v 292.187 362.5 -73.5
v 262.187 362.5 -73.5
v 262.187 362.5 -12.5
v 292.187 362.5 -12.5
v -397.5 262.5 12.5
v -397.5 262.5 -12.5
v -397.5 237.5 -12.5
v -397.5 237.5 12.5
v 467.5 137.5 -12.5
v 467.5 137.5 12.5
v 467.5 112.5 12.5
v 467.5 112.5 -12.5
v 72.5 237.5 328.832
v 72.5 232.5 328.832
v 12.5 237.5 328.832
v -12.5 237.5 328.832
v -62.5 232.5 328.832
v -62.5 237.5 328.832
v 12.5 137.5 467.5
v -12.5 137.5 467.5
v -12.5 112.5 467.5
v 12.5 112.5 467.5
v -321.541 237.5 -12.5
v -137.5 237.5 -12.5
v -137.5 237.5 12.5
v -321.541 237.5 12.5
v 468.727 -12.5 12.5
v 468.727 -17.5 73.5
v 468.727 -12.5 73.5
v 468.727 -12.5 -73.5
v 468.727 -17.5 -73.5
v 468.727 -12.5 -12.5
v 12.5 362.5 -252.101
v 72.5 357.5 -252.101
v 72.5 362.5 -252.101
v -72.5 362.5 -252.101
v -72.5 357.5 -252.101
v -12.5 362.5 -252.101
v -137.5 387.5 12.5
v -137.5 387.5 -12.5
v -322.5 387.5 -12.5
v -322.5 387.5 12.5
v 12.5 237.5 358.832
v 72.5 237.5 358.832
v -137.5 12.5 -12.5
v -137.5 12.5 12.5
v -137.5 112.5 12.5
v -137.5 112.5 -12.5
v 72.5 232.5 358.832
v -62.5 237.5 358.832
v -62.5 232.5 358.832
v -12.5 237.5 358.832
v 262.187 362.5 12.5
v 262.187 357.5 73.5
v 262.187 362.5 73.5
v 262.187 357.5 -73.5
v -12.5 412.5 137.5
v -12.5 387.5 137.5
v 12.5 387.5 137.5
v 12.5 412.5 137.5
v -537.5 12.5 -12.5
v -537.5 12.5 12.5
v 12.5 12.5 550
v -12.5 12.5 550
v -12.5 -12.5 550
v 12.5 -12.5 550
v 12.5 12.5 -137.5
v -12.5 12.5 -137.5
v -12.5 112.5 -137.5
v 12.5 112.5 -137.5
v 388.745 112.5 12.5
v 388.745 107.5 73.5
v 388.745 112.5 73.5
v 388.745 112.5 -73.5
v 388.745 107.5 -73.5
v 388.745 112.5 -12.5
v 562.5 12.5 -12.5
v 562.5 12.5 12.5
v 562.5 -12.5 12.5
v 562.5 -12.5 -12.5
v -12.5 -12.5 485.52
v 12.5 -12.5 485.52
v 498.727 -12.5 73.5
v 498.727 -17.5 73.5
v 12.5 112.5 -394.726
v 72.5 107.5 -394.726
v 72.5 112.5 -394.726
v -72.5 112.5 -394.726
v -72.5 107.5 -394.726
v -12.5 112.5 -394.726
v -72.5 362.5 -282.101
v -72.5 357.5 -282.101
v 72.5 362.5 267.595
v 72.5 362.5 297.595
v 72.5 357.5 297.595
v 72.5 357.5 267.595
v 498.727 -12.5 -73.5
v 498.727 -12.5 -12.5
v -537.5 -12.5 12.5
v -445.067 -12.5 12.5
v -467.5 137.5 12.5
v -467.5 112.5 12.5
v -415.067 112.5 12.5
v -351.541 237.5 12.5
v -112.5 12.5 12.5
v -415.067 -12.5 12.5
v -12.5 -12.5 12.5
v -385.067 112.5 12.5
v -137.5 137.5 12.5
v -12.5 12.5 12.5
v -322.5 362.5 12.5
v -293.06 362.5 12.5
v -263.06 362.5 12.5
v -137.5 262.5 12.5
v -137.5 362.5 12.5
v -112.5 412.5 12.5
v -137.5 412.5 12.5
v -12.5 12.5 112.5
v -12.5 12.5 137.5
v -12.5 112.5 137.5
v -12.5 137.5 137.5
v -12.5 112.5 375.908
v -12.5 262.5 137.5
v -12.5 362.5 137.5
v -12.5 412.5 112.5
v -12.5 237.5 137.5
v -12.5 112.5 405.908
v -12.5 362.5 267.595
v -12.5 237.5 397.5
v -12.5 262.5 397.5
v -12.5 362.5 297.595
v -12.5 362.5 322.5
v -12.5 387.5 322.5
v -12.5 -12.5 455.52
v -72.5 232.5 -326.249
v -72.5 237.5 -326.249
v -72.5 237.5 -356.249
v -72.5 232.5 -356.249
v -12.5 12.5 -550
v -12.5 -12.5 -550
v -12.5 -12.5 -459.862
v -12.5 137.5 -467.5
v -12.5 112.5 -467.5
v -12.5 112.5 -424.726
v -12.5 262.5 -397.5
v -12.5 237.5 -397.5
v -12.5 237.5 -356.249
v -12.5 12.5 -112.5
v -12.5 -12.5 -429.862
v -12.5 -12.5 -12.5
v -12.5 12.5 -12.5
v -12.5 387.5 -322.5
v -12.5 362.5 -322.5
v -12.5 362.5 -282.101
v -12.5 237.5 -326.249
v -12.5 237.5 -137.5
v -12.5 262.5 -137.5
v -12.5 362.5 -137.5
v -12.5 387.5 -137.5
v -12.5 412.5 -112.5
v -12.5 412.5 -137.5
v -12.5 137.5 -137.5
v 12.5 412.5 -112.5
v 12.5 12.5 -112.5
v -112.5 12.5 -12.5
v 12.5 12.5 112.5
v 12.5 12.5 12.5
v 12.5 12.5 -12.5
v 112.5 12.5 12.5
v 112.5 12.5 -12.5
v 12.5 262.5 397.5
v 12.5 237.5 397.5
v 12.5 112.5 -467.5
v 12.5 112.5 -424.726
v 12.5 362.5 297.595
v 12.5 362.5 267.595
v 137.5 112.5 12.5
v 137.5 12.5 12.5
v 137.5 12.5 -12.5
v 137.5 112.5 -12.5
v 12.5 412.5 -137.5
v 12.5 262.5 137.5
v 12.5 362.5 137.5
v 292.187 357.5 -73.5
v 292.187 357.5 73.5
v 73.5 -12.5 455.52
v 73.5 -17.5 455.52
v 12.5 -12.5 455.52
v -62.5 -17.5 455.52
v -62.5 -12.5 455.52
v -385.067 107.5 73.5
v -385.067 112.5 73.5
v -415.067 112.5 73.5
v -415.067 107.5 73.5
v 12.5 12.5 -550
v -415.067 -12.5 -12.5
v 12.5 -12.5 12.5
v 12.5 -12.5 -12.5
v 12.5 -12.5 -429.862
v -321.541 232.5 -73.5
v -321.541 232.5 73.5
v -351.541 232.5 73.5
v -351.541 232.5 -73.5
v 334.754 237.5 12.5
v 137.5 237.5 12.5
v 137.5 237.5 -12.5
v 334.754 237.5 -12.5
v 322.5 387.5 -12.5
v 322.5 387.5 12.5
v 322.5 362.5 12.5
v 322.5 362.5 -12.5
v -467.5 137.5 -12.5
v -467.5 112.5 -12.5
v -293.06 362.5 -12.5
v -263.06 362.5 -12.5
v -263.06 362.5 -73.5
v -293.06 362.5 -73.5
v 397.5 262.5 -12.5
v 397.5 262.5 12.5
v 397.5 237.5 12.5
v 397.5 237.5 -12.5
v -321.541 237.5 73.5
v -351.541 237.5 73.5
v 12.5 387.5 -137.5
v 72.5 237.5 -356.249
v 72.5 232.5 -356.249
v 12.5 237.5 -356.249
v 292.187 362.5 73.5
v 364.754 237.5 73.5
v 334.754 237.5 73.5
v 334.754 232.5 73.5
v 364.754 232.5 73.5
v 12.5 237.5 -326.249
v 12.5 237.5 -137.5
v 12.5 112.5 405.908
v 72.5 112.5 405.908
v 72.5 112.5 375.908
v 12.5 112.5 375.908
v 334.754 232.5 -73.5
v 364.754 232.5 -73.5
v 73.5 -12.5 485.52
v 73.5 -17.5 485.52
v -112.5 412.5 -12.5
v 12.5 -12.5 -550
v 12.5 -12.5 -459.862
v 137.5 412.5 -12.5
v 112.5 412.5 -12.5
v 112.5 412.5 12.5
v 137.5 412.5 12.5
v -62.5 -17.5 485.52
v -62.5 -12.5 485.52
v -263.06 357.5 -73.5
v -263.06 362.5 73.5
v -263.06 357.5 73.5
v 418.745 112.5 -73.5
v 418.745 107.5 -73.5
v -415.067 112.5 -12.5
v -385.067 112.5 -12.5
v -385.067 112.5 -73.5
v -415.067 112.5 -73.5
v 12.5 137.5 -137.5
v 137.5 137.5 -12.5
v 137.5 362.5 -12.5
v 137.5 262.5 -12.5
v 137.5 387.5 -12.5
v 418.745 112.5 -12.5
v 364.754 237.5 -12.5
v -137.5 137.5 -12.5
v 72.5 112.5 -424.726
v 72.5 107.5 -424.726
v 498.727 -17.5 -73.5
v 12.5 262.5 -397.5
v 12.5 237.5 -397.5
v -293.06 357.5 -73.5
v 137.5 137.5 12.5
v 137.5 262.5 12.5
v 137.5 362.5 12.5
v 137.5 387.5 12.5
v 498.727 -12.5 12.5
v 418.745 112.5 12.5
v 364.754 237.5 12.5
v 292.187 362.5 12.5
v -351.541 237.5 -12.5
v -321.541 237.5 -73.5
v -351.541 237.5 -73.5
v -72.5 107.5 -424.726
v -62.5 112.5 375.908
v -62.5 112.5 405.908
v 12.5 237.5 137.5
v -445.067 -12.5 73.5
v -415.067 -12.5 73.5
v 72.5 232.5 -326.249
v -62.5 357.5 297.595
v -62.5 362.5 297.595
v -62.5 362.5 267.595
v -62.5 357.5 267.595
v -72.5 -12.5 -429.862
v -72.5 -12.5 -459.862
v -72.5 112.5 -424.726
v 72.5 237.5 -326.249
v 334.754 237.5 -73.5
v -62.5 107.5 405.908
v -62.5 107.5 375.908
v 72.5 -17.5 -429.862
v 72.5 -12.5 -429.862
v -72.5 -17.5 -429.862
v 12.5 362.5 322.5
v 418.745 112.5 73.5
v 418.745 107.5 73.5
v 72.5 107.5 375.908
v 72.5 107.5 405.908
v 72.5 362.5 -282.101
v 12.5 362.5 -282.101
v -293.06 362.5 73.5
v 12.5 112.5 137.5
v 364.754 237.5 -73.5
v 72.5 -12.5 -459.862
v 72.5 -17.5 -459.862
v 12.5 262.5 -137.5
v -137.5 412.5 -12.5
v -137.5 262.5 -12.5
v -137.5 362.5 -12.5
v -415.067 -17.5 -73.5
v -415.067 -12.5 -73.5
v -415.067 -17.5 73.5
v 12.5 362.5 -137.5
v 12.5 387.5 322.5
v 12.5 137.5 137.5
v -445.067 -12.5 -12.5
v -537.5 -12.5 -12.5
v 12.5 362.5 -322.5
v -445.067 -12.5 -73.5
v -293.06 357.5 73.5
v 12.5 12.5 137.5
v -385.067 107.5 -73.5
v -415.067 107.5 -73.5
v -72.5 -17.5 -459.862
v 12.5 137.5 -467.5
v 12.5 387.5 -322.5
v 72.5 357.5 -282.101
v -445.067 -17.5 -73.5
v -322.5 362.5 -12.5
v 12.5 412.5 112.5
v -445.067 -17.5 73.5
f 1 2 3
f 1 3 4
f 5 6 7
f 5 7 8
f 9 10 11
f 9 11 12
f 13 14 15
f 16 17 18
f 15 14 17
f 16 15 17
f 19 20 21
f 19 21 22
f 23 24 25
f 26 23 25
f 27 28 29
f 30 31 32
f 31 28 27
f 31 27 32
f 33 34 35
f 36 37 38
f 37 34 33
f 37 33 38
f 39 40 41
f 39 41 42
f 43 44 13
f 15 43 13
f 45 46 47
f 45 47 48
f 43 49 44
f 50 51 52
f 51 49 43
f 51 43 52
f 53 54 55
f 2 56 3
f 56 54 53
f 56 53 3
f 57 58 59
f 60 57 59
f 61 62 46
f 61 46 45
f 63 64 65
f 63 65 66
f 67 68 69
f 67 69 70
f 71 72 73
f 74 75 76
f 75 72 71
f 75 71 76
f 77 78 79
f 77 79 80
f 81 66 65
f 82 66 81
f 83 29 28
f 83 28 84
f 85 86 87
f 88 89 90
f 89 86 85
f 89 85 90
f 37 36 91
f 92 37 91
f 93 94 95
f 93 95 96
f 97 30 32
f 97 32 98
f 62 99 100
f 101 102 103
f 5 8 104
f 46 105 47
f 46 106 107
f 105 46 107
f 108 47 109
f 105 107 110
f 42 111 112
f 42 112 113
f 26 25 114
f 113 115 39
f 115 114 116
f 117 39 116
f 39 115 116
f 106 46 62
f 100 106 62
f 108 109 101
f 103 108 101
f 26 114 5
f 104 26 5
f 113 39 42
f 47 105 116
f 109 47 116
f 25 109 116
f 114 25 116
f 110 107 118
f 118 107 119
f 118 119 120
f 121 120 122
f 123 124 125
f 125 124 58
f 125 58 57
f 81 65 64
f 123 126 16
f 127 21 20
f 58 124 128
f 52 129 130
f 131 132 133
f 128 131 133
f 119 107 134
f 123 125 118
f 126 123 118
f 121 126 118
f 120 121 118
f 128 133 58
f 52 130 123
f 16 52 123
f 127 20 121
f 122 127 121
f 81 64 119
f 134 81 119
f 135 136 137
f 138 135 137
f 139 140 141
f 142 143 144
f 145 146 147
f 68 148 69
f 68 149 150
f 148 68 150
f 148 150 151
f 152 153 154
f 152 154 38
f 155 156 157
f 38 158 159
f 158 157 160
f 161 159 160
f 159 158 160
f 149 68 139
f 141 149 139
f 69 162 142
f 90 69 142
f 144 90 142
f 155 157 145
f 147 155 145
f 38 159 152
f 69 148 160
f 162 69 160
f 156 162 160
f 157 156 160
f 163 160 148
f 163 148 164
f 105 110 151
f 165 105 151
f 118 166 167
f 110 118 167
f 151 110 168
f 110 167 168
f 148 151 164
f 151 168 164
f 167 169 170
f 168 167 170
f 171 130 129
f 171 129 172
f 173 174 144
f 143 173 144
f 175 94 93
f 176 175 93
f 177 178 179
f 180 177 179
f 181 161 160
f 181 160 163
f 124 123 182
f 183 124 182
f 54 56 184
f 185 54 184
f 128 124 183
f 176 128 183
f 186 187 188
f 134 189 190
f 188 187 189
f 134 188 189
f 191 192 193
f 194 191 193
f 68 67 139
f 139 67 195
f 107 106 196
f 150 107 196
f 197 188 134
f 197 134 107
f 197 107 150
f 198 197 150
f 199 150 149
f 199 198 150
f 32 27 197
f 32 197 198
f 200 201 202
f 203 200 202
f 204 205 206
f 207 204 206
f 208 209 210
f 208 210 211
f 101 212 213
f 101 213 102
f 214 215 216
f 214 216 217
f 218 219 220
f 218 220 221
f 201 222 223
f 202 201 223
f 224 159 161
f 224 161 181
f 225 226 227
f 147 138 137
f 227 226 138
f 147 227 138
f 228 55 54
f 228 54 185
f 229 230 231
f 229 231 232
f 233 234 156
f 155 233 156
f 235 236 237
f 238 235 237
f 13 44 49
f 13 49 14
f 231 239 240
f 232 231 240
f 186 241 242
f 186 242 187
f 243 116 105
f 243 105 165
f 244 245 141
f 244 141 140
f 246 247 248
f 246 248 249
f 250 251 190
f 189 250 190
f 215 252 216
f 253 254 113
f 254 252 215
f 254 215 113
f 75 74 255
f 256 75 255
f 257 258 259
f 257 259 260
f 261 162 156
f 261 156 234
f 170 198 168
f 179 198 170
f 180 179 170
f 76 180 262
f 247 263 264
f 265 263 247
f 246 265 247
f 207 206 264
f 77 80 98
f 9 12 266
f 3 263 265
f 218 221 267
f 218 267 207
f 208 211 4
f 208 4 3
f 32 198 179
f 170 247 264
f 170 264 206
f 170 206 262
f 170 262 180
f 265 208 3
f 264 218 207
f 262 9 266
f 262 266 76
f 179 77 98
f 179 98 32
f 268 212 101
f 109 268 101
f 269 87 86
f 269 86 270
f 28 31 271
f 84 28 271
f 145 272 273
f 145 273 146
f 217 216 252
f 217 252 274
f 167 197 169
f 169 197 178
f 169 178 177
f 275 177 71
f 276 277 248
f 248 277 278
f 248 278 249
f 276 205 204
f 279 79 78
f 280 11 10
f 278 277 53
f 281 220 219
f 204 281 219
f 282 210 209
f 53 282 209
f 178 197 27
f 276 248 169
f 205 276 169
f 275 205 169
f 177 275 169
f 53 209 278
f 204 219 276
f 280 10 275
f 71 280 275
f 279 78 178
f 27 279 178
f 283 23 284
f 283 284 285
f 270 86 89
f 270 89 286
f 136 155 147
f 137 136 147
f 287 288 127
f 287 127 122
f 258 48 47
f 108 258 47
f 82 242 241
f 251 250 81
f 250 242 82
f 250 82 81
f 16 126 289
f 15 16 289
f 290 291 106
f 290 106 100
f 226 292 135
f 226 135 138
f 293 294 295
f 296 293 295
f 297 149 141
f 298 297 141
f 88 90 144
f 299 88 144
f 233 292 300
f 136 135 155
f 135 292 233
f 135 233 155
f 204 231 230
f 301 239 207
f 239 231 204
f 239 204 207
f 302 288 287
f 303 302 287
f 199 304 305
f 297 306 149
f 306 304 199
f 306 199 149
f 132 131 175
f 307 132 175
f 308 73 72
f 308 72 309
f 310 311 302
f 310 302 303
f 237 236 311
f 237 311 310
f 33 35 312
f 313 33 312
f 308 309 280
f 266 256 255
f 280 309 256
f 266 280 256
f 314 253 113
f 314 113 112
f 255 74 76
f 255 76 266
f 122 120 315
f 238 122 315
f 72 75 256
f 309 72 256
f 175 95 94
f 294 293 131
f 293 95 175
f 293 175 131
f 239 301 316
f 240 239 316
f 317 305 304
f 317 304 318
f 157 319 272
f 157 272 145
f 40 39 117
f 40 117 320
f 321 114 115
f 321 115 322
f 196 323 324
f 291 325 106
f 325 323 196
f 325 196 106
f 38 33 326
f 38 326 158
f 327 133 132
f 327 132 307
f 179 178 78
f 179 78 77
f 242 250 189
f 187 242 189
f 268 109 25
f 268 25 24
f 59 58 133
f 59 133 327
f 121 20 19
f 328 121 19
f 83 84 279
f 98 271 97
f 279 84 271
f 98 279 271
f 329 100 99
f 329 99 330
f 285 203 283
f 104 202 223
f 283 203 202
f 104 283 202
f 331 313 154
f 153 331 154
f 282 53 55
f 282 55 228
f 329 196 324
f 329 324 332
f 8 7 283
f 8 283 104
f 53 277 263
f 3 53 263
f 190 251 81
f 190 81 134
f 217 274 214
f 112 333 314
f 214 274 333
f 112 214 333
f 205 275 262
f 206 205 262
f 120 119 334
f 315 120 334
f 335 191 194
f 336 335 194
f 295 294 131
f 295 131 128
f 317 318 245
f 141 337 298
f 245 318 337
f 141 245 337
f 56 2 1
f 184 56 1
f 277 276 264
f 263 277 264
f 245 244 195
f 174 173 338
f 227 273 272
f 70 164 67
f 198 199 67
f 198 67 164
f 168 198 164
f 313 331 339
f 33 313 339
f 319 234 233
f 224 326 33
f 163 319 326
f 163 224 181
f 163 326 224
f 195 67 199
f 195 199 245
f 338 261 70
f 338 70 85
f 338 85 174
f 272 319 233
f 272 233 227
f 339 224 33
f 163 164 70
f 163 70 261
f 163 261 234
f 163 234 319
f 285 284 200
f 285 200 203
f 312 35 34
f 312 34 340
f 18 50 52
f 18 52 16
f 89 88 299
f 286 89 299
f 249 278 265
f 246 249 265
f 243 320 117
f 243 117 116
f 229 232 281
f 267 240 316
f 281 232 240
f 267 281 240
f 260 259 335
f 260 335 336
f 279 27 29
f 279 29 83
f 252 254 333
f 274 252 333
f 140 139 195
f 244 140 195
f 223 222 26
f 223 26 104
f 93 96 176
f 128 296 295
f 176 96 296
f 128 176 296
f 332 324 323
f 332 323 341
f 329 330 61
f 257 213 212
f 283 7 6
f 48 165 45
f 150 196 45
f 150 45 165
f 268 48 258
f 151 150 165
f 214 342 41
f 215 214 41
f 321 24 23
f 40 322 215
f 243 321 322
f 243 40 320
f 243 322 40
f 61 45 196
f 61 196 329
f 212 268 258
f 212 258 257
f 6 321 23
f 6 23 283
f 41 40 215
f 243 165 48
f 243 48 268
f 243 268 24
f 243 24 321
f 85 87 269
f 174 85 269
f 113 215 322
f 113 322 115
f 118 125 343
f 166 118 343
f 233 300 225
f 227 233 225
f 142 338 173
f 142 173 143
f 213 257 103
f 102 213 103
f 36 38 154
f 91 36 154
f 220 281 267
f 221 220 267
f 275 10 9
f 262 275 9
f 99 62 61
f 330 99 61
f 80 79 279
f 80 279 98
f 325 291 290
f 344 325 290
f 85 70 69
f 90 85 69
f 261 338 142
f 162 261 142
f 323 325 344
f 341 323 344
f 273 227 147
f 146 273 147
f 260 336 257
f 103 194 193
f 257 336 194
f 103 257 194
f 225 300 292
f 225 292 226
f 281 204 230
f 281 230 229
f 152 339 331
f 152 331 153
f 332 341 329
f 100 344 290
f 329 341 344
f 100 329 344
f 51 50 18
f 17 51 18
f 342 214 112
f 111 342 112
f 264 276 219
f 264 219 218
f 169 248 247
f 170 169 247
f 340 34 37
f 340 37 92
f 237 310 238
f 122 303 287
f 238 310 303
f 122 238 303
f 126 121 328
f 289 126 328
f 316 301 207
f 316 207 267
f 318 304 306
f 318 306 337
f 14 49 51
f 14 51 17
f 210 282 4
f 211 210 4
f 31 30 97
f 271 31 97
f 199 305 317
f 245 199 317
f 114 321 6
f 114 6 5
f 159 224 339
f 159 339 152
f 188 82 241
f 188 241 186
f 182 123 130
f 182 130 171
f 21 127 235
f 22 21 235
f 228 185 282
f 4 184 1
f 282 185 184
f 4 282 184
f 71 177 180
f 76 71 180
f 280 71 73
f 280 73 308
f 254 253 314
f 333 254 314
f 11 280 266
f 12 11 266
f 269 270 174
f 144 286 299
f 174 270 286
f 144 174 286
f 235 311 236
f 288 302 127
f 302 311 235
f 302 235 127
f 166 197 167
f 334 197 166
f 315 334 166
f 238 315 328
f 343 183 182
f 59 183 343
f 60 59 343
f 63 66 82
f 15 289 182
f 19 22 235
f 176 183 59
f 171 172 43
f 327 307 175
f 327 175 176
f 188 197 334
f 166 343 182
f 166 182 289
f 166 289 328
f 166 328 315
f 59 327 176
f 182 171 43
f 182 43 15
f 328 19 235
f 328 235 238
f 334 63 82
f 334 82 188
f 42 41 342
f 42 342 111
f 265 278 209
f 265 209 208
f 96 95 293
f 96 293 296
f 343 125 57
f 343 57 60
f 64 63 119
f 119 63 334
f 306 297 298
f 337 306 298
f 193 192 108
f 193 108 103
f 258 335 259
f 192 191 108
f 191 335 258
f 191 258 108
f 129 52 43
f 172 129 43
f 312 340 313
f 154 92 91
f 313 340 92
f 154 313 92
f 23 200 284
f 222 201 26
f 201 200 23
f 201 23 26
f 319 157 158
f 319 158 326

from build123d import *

# Parameters (mm, degrees)
SKETCH3_W                 = 25
SKETCH3_H                 = 25
BOSS_EXTRUDE2_DEPTH       = 550
SKETCH5_W                 = 25
SKETCH5_H                 = 25
BOSS_EXTRUDE3_DEPTH       = 550
SKETCH7_W                 = 25
SKETCH7_H                 = 25
BOSS_EXTRUDE4_DEPTH       = 400
SKETCH8_W                 = 25
SKETCH8_H                 = 25
BOSS_EXTRUDE5_DEPTH       = 400
SKETCH9_W                 = 25
SKETCH9_H                 = 25
BOSS_EXTRUDE7_DEPTH       = 260
SKETCH9_5_W               = 25
SKETCH9_5_H               = 25
BOSS_EXTRUDE8_DEPTH       = 330
SKETCH9_8_W               = 25
SKETCH9_8_H               = 25
BOSS_EXTRUDE10_DEPTH      = 185
SKETCH11_W                = 25
SKETCH11_H                = 25
BOSS_EXTRUDE11_DEPTH      = 185
SKETCH11_5_W              = 25
SKETCH11_5_H              = 25
BOSS_EXTRUDE12_DEPTH      = 260
SKETCH11_6_W              = 25
SKETCH11_6_H              = 25
BOSS_EXTRUDE13_DEPTH      = 330
SKETCH12_W                = 25
SKETCH12_H                = 25
BOSS_EXTRUDE14_DEPTH      = 185
SKETCH12_3_W              = 25
SKETCH12_3_H              = 25
BOSS_EXTRUDE15_DEPTH      = 260
SKETCH12_4_W              = 25
SKETCH12_4_H              = 25
BOSS_EXTRUDE16_DEPTH      = 330
SKETCH13_W                = 25
SKETCH13_H                = 25
BOSS_EXTRUDE17_DEPTH      = 330
SKETCH13_3_W              = 25
SKETCH13_3_H              = 25
BOSS_EXTRUDE18_DEPTH      = 260
SKETCH13_4_W              = 25
SKETCH13_4_H              = 25
BOSS_EXTRUDE19_DEPTH      = 185
BOSS_EXTRUDE21_DEPTH      = 61
BOSS_EXTRUDE21_DEPTH_BACK = 75
SKETCH15_W                = 30
SKETCH15_H                = 5
BOSS_EXTRUDE22_DEPTH      = 60
BOSS_EXTRUDE22_DEPTH_BACK = 75
SKETCH16_W                = 30
SKETCH16_H                = 5
BOSS_EXTRUDE23_DEPTH      = 61
BOSS_EXTRUDE23_DEPTH_BACK = 86
SKETCH18_W                = 30
SKETCH18_H                = 5
BOSS_EXTRUDE24_DEPTH      = 60
BOSS_EXTRUDE24_DEPTH_BACK = 85
SKETCH19_W                = 30
SKETCH19_H                = 5
BOSS_EXTRUDE27_DEPTH      = 61
BOSS_EXTRUDE27_DEPTH_BACK = 86
SKETCH20_W                = 30
SKETCH20_H                = 5


with BuildPart() as part:
    # Sketch3 → Boss-Extrude2 (new, symmetric)
    with BuildSketch(Plane.XY):
        Rectangle(SKETCH3_W, SKETCH3_H)
    extrude(amount=BOSS_EXTRUDE2_DEPTH, both=True)

    # Sketch5 → Boss-Extrude3 (add, symmetric)
    with BuildSketch(Plane(origin=(12.5, 0, 0), x_dir=(0, 0, -1), z_dir=(1, 0, 0))):
        Rectangle(SKETCH5_W, SKETCH5_H)
    extrude(amount=BOSS_EXTRUDE3_DEPTH, both=True)

    # Sketch7 → Boss-Extrude4 (add)
    with BuildSketch(Plane(origin=(0, 12.5, 0), x_dir=(1, 0, 0), z_dir=(0, 1, 0))):
        with Locations((0, -125)):
            Rectangle(SKETCH7_W, SKETCH7_H)
        with Locations((0, 125)):
            Rectangle(SKETCH7_W, SKETCH7_H)
    extrude(amount=BOSS_EXTRUDE4_DEPTH)

    # Sketch8 → Boss-Extrude5 (add)
    with BuildSketch(Plane(origin=(0, 12.5, 0), x_dir=(1, 0, 0), z_dir=(0, 1, 0))):
        with Locations((125, 0)):
            Rectangle(SKETCH8_W, SKETCH8_H)
        with Locations((-125, 0)):
            Rectangle(SKETCH8_W, SKETCH8_H)
    extrude(amount=BOSS_EXTRUDE5_DEPTH)

    # Sketch9 → Boss-Extrude7 (add)
    with BuildSketch(Plane.XY.offset(137.5)):
        with Locations((0, 250)):
            Rectangle(SKETCH9_W, SKETCH9_H)
    extrude(amount=BOSS_EXTRUDE7_DEPTH)

    # Sketch9<5> → Boss-Extrude8 (add)
    with BuildSketch(Plane.XY.offset(137.5)):
        with Locations((0, 125)):
            Rectangle(SKETCH9_5_W, SKETCH9_5_H)
    extrude(amount=BOSS_EXTRUDE8_DEPTH)

    # Sketch9<8> → Boss-Extrude10 (add)
    with BuildSketch(Plane.XY.offset(137.5)):
        with Locations((0, 375)):
            Rectangle(SKETCH9_8_W, SKETCH9_8_H)
    extrude(amount=BOSS_EXTRUDE10_DEPTH)

    # Sketch11 → Boss-Extrude11 (add)
    with BuildSketch(Plane.ZY.offset(137.5)):
        with Locations((0, 375)):
            Rectangle(SKETCH11_W, SKETCH11_H)
    extrude(amount=BOSS_EXTRUDE11_DEPTH)

    # Sketch11<5> → Boss-Extrude12 (add)
    with BuildSketch(Plane.ZY.offset(137.5)):
        with Locations((0, 250)):
            Rectangle(SKETCH11_5_W, SKETCH11_5_H)
    extrude(amount=BOSS_EXTRUDE12_DEPTH)

    # Sketch11<6> → Boss-Extrude13 (add)
    with BuildSketch(Plane.ZY.offset(137.5)):
        with Locations((0, 125)):
            Rectangle(SKETCH11_6_W, SKETCH11_6_H)
    extrude(amount=BOSS_EXTRUDE13_DEPTH)

    # Sketch12 → Boss-Extrude14 (add)
    with BuildSketch(Plane(origin=(0, 0, -137.5), x_dir=(-1, 0, 0), z_dir=(0, 0, -1))):
        with Locations((0, 375)):
            Rectangle(SKETCH12_W, SKETCH12_H)
    extrude(amount=BOSS_EXTRUDE14_DEPTH)

    # Sketch12<3> → Boss-Extrude15 (add)
    with BuildSketch(Plane(origin=(0, 0, -137.5), x_dir=(-1, 0, 0), z_dir=(0, 0, -1))):
        with Locations((0, 250)):
            Rectangle(SKETCH12_3_W, SKETCH12_3_H)
    extrude(amount=BOSS_EXTRUDE15_DEPTH)

    # Sketch12<4> → Boss-Extrude16 (add)
    with BuildSketch(Plane(origin=(0, 0, -137.5), x_dir=(-1, 0, 0), z_dir=(0, 0, -1))):
        with Locations((0, 125)):
            Rectangle(SKETCH12_4_W, SKETCH12_4_H)
    extrude(amount=BOSS_EXTRUDE16_DEPTH)

    # Sketch13 → Boss-Extrude17 (add)
    with BuildSketch(Plane(origin=(137.5, 0, 0), x_dir=(0, 0, -1), z_dir=(1, 0, 0))):
        with Locations((0, 125)):
            Rectangle(SKETCH13_W, SKETCH13_H)
    extrude(amount=BOSS_EXTRUDE17_DEPTH)

    # Sketch13<3> → Boss-Extrude18 (add)
    with BuildSketch(Plane(origin=(137.5, 0, 0), x_dir=(0, 0, -1), z_dir=(1, 0, 0))):
        with Locations((0, 250)):
            Rectangle(SKETCH13_3_W, SKETCH13_3_H)
    extrude(amount=BOSS_EXTRUDE18_DEPTH)

    # Sketch13<4> → Boss-Extrude19 (add)
    with BuildSketch(Plane(origin=(137.5, 0, 0), x_dir=(0, 0, -1), z_dir=(1, 0, 0))):
        with Locations((0, 375)):
            Rectangle(SKETCH13_4_W, SKETCH13_4_H)
    extrude(amount=BOSS_EXTRUDE19_DEPTH)

    # Sketch15 → Boss-Extrude21 (add, two sides: drawn at the far end of the back side and taken through both)
    with BuildSketch(Plane(origin=(12.5, 0, 0), x_dir=(0, 0, -1), z_dir=(1, 0, 0)).offset(-BOSS_EXTRUDE21_DEPTH_BACK)):
        with Locations((-470.519761445, -15)):
            Rectangle(SKETCH15_W, SKETCH15_H)
    extrude(amount=BOSS_EXTRUDE21_DEPTH + BOSS_EXTRUDE21_DEPTH_BACK)

    # Sketch16 → Boss-Extrude22 (add, two sides: drawn at the far end of the back side and taken through both)
    with BuildSketch(Plane(origin=(12.5, 0, 0), x_dir=(0, 0, -1), z_dir=(1, 0, 0)).offset(-BOSS_EXTRUDE22_DEPTH_BACK)):
        with Locations((-390.907976081, 110)):
            Rectangle(SKETCH16_W, SKETCH16_H)
        with Locations((-343.832488687, 235)):
            Rectangle(SKETCH16_W, SKETCH16_H)
        with Locations((-282.595194205, 360)):
            Rectangle(SKETCH16_W, SKETCH16_H)
    extrude(amount=BOSS_EXTRUDE22_DEPTH + BOSS_EXTRUDE22_DEPTH_BACK)

    # Sketch18 → Boss-Extrude23 (add, two sides: drawn at the far end of the back side and taken through both)
    with BuildSketch(Plane.XY.offset(12.5).offset(-BOSS_EXTRUDE23_DEPTH_BACK)):
        with Locations((483.727363311, -15)):
            Rectangle(SKETCH18_W, SKETCH18_H)
        with Locations((403.744811794, 110)):
            Rectangle(SKETCH18_W, SKETCH18_H)
        with Locations((349.754481778, 235)):
            Rectangle(SKETCH18_W, SKETCH18_H)
        with Locations((277.187384398, 360)):
            Rectangle(SKETCH18_W, SKETCH18_H)
    extrude(amount=BOSS_EXTRUDE23_DEPTH + BOSS_EXTRUDE23_DEPTH_BACK)

    # Sketch19 → Boss-Extrude24 (add, two sides: drawn at the far end of the back side and taken through both)
    with BuildSketch(Plane(origin=(12.5, 0, 0), x_dir=(0, 0, -1), z_dir=(1, 0, 0)).offset(-BOSS_EXTRUDE24_DEPTH_BACK)):
        with Locations((444.861975809, -15)):
            Rectangle(SKETCH19_W, SKETCH19_H)
        with Locations((409.726408873, 110)):
            Rectangle(SKETCH19_W, SKETCH19_H)
        with Locations((341.249082781, 235)):
            Rectangle(SKETCH19_W, SKETCH19_H)
        with Locations((267.100501546, 360)):
            Rectangle(SKETCH19_W, SKETCH19_H)
    extrude(amount=BOSS_EXTRUDE24_DEPTH + BOSS_EXTRUDE24_DEPTH_BACK)

    # Sketch20 → Boss-Extrude27 (add, two sides: drawn at the far end of the back side and taken through both)
    with BuildSketch(Plane(origin=(0, 0, -12.5), x_dir=(-1, 0, 0), z_dir=(0, 0, -1)).offset(-BOSS_EXTRUDE27_DEPTH_BACK)):
        with Locations((430.066631827, -15)):
            Rectangle(SKETCH20_W, SKETCH20_H)
        with Locations((400.066631827, 110)):
            Rectangle(SKETCH20_W, SKETCH20_H)
        with Locations((336.540647737, 235)):
            Rectangle(SKETCH20_W, SKETCH20_H)
        with Locations((278.06024781, 360)):
            Rectangle(SKETCH20_W, SKETCH20_H)
    extrude(amount=BOSS_EXTRUDE27_DEPTH + BOSS_EXTRUDE27_DEPTH_BACK)


solid = part.part
